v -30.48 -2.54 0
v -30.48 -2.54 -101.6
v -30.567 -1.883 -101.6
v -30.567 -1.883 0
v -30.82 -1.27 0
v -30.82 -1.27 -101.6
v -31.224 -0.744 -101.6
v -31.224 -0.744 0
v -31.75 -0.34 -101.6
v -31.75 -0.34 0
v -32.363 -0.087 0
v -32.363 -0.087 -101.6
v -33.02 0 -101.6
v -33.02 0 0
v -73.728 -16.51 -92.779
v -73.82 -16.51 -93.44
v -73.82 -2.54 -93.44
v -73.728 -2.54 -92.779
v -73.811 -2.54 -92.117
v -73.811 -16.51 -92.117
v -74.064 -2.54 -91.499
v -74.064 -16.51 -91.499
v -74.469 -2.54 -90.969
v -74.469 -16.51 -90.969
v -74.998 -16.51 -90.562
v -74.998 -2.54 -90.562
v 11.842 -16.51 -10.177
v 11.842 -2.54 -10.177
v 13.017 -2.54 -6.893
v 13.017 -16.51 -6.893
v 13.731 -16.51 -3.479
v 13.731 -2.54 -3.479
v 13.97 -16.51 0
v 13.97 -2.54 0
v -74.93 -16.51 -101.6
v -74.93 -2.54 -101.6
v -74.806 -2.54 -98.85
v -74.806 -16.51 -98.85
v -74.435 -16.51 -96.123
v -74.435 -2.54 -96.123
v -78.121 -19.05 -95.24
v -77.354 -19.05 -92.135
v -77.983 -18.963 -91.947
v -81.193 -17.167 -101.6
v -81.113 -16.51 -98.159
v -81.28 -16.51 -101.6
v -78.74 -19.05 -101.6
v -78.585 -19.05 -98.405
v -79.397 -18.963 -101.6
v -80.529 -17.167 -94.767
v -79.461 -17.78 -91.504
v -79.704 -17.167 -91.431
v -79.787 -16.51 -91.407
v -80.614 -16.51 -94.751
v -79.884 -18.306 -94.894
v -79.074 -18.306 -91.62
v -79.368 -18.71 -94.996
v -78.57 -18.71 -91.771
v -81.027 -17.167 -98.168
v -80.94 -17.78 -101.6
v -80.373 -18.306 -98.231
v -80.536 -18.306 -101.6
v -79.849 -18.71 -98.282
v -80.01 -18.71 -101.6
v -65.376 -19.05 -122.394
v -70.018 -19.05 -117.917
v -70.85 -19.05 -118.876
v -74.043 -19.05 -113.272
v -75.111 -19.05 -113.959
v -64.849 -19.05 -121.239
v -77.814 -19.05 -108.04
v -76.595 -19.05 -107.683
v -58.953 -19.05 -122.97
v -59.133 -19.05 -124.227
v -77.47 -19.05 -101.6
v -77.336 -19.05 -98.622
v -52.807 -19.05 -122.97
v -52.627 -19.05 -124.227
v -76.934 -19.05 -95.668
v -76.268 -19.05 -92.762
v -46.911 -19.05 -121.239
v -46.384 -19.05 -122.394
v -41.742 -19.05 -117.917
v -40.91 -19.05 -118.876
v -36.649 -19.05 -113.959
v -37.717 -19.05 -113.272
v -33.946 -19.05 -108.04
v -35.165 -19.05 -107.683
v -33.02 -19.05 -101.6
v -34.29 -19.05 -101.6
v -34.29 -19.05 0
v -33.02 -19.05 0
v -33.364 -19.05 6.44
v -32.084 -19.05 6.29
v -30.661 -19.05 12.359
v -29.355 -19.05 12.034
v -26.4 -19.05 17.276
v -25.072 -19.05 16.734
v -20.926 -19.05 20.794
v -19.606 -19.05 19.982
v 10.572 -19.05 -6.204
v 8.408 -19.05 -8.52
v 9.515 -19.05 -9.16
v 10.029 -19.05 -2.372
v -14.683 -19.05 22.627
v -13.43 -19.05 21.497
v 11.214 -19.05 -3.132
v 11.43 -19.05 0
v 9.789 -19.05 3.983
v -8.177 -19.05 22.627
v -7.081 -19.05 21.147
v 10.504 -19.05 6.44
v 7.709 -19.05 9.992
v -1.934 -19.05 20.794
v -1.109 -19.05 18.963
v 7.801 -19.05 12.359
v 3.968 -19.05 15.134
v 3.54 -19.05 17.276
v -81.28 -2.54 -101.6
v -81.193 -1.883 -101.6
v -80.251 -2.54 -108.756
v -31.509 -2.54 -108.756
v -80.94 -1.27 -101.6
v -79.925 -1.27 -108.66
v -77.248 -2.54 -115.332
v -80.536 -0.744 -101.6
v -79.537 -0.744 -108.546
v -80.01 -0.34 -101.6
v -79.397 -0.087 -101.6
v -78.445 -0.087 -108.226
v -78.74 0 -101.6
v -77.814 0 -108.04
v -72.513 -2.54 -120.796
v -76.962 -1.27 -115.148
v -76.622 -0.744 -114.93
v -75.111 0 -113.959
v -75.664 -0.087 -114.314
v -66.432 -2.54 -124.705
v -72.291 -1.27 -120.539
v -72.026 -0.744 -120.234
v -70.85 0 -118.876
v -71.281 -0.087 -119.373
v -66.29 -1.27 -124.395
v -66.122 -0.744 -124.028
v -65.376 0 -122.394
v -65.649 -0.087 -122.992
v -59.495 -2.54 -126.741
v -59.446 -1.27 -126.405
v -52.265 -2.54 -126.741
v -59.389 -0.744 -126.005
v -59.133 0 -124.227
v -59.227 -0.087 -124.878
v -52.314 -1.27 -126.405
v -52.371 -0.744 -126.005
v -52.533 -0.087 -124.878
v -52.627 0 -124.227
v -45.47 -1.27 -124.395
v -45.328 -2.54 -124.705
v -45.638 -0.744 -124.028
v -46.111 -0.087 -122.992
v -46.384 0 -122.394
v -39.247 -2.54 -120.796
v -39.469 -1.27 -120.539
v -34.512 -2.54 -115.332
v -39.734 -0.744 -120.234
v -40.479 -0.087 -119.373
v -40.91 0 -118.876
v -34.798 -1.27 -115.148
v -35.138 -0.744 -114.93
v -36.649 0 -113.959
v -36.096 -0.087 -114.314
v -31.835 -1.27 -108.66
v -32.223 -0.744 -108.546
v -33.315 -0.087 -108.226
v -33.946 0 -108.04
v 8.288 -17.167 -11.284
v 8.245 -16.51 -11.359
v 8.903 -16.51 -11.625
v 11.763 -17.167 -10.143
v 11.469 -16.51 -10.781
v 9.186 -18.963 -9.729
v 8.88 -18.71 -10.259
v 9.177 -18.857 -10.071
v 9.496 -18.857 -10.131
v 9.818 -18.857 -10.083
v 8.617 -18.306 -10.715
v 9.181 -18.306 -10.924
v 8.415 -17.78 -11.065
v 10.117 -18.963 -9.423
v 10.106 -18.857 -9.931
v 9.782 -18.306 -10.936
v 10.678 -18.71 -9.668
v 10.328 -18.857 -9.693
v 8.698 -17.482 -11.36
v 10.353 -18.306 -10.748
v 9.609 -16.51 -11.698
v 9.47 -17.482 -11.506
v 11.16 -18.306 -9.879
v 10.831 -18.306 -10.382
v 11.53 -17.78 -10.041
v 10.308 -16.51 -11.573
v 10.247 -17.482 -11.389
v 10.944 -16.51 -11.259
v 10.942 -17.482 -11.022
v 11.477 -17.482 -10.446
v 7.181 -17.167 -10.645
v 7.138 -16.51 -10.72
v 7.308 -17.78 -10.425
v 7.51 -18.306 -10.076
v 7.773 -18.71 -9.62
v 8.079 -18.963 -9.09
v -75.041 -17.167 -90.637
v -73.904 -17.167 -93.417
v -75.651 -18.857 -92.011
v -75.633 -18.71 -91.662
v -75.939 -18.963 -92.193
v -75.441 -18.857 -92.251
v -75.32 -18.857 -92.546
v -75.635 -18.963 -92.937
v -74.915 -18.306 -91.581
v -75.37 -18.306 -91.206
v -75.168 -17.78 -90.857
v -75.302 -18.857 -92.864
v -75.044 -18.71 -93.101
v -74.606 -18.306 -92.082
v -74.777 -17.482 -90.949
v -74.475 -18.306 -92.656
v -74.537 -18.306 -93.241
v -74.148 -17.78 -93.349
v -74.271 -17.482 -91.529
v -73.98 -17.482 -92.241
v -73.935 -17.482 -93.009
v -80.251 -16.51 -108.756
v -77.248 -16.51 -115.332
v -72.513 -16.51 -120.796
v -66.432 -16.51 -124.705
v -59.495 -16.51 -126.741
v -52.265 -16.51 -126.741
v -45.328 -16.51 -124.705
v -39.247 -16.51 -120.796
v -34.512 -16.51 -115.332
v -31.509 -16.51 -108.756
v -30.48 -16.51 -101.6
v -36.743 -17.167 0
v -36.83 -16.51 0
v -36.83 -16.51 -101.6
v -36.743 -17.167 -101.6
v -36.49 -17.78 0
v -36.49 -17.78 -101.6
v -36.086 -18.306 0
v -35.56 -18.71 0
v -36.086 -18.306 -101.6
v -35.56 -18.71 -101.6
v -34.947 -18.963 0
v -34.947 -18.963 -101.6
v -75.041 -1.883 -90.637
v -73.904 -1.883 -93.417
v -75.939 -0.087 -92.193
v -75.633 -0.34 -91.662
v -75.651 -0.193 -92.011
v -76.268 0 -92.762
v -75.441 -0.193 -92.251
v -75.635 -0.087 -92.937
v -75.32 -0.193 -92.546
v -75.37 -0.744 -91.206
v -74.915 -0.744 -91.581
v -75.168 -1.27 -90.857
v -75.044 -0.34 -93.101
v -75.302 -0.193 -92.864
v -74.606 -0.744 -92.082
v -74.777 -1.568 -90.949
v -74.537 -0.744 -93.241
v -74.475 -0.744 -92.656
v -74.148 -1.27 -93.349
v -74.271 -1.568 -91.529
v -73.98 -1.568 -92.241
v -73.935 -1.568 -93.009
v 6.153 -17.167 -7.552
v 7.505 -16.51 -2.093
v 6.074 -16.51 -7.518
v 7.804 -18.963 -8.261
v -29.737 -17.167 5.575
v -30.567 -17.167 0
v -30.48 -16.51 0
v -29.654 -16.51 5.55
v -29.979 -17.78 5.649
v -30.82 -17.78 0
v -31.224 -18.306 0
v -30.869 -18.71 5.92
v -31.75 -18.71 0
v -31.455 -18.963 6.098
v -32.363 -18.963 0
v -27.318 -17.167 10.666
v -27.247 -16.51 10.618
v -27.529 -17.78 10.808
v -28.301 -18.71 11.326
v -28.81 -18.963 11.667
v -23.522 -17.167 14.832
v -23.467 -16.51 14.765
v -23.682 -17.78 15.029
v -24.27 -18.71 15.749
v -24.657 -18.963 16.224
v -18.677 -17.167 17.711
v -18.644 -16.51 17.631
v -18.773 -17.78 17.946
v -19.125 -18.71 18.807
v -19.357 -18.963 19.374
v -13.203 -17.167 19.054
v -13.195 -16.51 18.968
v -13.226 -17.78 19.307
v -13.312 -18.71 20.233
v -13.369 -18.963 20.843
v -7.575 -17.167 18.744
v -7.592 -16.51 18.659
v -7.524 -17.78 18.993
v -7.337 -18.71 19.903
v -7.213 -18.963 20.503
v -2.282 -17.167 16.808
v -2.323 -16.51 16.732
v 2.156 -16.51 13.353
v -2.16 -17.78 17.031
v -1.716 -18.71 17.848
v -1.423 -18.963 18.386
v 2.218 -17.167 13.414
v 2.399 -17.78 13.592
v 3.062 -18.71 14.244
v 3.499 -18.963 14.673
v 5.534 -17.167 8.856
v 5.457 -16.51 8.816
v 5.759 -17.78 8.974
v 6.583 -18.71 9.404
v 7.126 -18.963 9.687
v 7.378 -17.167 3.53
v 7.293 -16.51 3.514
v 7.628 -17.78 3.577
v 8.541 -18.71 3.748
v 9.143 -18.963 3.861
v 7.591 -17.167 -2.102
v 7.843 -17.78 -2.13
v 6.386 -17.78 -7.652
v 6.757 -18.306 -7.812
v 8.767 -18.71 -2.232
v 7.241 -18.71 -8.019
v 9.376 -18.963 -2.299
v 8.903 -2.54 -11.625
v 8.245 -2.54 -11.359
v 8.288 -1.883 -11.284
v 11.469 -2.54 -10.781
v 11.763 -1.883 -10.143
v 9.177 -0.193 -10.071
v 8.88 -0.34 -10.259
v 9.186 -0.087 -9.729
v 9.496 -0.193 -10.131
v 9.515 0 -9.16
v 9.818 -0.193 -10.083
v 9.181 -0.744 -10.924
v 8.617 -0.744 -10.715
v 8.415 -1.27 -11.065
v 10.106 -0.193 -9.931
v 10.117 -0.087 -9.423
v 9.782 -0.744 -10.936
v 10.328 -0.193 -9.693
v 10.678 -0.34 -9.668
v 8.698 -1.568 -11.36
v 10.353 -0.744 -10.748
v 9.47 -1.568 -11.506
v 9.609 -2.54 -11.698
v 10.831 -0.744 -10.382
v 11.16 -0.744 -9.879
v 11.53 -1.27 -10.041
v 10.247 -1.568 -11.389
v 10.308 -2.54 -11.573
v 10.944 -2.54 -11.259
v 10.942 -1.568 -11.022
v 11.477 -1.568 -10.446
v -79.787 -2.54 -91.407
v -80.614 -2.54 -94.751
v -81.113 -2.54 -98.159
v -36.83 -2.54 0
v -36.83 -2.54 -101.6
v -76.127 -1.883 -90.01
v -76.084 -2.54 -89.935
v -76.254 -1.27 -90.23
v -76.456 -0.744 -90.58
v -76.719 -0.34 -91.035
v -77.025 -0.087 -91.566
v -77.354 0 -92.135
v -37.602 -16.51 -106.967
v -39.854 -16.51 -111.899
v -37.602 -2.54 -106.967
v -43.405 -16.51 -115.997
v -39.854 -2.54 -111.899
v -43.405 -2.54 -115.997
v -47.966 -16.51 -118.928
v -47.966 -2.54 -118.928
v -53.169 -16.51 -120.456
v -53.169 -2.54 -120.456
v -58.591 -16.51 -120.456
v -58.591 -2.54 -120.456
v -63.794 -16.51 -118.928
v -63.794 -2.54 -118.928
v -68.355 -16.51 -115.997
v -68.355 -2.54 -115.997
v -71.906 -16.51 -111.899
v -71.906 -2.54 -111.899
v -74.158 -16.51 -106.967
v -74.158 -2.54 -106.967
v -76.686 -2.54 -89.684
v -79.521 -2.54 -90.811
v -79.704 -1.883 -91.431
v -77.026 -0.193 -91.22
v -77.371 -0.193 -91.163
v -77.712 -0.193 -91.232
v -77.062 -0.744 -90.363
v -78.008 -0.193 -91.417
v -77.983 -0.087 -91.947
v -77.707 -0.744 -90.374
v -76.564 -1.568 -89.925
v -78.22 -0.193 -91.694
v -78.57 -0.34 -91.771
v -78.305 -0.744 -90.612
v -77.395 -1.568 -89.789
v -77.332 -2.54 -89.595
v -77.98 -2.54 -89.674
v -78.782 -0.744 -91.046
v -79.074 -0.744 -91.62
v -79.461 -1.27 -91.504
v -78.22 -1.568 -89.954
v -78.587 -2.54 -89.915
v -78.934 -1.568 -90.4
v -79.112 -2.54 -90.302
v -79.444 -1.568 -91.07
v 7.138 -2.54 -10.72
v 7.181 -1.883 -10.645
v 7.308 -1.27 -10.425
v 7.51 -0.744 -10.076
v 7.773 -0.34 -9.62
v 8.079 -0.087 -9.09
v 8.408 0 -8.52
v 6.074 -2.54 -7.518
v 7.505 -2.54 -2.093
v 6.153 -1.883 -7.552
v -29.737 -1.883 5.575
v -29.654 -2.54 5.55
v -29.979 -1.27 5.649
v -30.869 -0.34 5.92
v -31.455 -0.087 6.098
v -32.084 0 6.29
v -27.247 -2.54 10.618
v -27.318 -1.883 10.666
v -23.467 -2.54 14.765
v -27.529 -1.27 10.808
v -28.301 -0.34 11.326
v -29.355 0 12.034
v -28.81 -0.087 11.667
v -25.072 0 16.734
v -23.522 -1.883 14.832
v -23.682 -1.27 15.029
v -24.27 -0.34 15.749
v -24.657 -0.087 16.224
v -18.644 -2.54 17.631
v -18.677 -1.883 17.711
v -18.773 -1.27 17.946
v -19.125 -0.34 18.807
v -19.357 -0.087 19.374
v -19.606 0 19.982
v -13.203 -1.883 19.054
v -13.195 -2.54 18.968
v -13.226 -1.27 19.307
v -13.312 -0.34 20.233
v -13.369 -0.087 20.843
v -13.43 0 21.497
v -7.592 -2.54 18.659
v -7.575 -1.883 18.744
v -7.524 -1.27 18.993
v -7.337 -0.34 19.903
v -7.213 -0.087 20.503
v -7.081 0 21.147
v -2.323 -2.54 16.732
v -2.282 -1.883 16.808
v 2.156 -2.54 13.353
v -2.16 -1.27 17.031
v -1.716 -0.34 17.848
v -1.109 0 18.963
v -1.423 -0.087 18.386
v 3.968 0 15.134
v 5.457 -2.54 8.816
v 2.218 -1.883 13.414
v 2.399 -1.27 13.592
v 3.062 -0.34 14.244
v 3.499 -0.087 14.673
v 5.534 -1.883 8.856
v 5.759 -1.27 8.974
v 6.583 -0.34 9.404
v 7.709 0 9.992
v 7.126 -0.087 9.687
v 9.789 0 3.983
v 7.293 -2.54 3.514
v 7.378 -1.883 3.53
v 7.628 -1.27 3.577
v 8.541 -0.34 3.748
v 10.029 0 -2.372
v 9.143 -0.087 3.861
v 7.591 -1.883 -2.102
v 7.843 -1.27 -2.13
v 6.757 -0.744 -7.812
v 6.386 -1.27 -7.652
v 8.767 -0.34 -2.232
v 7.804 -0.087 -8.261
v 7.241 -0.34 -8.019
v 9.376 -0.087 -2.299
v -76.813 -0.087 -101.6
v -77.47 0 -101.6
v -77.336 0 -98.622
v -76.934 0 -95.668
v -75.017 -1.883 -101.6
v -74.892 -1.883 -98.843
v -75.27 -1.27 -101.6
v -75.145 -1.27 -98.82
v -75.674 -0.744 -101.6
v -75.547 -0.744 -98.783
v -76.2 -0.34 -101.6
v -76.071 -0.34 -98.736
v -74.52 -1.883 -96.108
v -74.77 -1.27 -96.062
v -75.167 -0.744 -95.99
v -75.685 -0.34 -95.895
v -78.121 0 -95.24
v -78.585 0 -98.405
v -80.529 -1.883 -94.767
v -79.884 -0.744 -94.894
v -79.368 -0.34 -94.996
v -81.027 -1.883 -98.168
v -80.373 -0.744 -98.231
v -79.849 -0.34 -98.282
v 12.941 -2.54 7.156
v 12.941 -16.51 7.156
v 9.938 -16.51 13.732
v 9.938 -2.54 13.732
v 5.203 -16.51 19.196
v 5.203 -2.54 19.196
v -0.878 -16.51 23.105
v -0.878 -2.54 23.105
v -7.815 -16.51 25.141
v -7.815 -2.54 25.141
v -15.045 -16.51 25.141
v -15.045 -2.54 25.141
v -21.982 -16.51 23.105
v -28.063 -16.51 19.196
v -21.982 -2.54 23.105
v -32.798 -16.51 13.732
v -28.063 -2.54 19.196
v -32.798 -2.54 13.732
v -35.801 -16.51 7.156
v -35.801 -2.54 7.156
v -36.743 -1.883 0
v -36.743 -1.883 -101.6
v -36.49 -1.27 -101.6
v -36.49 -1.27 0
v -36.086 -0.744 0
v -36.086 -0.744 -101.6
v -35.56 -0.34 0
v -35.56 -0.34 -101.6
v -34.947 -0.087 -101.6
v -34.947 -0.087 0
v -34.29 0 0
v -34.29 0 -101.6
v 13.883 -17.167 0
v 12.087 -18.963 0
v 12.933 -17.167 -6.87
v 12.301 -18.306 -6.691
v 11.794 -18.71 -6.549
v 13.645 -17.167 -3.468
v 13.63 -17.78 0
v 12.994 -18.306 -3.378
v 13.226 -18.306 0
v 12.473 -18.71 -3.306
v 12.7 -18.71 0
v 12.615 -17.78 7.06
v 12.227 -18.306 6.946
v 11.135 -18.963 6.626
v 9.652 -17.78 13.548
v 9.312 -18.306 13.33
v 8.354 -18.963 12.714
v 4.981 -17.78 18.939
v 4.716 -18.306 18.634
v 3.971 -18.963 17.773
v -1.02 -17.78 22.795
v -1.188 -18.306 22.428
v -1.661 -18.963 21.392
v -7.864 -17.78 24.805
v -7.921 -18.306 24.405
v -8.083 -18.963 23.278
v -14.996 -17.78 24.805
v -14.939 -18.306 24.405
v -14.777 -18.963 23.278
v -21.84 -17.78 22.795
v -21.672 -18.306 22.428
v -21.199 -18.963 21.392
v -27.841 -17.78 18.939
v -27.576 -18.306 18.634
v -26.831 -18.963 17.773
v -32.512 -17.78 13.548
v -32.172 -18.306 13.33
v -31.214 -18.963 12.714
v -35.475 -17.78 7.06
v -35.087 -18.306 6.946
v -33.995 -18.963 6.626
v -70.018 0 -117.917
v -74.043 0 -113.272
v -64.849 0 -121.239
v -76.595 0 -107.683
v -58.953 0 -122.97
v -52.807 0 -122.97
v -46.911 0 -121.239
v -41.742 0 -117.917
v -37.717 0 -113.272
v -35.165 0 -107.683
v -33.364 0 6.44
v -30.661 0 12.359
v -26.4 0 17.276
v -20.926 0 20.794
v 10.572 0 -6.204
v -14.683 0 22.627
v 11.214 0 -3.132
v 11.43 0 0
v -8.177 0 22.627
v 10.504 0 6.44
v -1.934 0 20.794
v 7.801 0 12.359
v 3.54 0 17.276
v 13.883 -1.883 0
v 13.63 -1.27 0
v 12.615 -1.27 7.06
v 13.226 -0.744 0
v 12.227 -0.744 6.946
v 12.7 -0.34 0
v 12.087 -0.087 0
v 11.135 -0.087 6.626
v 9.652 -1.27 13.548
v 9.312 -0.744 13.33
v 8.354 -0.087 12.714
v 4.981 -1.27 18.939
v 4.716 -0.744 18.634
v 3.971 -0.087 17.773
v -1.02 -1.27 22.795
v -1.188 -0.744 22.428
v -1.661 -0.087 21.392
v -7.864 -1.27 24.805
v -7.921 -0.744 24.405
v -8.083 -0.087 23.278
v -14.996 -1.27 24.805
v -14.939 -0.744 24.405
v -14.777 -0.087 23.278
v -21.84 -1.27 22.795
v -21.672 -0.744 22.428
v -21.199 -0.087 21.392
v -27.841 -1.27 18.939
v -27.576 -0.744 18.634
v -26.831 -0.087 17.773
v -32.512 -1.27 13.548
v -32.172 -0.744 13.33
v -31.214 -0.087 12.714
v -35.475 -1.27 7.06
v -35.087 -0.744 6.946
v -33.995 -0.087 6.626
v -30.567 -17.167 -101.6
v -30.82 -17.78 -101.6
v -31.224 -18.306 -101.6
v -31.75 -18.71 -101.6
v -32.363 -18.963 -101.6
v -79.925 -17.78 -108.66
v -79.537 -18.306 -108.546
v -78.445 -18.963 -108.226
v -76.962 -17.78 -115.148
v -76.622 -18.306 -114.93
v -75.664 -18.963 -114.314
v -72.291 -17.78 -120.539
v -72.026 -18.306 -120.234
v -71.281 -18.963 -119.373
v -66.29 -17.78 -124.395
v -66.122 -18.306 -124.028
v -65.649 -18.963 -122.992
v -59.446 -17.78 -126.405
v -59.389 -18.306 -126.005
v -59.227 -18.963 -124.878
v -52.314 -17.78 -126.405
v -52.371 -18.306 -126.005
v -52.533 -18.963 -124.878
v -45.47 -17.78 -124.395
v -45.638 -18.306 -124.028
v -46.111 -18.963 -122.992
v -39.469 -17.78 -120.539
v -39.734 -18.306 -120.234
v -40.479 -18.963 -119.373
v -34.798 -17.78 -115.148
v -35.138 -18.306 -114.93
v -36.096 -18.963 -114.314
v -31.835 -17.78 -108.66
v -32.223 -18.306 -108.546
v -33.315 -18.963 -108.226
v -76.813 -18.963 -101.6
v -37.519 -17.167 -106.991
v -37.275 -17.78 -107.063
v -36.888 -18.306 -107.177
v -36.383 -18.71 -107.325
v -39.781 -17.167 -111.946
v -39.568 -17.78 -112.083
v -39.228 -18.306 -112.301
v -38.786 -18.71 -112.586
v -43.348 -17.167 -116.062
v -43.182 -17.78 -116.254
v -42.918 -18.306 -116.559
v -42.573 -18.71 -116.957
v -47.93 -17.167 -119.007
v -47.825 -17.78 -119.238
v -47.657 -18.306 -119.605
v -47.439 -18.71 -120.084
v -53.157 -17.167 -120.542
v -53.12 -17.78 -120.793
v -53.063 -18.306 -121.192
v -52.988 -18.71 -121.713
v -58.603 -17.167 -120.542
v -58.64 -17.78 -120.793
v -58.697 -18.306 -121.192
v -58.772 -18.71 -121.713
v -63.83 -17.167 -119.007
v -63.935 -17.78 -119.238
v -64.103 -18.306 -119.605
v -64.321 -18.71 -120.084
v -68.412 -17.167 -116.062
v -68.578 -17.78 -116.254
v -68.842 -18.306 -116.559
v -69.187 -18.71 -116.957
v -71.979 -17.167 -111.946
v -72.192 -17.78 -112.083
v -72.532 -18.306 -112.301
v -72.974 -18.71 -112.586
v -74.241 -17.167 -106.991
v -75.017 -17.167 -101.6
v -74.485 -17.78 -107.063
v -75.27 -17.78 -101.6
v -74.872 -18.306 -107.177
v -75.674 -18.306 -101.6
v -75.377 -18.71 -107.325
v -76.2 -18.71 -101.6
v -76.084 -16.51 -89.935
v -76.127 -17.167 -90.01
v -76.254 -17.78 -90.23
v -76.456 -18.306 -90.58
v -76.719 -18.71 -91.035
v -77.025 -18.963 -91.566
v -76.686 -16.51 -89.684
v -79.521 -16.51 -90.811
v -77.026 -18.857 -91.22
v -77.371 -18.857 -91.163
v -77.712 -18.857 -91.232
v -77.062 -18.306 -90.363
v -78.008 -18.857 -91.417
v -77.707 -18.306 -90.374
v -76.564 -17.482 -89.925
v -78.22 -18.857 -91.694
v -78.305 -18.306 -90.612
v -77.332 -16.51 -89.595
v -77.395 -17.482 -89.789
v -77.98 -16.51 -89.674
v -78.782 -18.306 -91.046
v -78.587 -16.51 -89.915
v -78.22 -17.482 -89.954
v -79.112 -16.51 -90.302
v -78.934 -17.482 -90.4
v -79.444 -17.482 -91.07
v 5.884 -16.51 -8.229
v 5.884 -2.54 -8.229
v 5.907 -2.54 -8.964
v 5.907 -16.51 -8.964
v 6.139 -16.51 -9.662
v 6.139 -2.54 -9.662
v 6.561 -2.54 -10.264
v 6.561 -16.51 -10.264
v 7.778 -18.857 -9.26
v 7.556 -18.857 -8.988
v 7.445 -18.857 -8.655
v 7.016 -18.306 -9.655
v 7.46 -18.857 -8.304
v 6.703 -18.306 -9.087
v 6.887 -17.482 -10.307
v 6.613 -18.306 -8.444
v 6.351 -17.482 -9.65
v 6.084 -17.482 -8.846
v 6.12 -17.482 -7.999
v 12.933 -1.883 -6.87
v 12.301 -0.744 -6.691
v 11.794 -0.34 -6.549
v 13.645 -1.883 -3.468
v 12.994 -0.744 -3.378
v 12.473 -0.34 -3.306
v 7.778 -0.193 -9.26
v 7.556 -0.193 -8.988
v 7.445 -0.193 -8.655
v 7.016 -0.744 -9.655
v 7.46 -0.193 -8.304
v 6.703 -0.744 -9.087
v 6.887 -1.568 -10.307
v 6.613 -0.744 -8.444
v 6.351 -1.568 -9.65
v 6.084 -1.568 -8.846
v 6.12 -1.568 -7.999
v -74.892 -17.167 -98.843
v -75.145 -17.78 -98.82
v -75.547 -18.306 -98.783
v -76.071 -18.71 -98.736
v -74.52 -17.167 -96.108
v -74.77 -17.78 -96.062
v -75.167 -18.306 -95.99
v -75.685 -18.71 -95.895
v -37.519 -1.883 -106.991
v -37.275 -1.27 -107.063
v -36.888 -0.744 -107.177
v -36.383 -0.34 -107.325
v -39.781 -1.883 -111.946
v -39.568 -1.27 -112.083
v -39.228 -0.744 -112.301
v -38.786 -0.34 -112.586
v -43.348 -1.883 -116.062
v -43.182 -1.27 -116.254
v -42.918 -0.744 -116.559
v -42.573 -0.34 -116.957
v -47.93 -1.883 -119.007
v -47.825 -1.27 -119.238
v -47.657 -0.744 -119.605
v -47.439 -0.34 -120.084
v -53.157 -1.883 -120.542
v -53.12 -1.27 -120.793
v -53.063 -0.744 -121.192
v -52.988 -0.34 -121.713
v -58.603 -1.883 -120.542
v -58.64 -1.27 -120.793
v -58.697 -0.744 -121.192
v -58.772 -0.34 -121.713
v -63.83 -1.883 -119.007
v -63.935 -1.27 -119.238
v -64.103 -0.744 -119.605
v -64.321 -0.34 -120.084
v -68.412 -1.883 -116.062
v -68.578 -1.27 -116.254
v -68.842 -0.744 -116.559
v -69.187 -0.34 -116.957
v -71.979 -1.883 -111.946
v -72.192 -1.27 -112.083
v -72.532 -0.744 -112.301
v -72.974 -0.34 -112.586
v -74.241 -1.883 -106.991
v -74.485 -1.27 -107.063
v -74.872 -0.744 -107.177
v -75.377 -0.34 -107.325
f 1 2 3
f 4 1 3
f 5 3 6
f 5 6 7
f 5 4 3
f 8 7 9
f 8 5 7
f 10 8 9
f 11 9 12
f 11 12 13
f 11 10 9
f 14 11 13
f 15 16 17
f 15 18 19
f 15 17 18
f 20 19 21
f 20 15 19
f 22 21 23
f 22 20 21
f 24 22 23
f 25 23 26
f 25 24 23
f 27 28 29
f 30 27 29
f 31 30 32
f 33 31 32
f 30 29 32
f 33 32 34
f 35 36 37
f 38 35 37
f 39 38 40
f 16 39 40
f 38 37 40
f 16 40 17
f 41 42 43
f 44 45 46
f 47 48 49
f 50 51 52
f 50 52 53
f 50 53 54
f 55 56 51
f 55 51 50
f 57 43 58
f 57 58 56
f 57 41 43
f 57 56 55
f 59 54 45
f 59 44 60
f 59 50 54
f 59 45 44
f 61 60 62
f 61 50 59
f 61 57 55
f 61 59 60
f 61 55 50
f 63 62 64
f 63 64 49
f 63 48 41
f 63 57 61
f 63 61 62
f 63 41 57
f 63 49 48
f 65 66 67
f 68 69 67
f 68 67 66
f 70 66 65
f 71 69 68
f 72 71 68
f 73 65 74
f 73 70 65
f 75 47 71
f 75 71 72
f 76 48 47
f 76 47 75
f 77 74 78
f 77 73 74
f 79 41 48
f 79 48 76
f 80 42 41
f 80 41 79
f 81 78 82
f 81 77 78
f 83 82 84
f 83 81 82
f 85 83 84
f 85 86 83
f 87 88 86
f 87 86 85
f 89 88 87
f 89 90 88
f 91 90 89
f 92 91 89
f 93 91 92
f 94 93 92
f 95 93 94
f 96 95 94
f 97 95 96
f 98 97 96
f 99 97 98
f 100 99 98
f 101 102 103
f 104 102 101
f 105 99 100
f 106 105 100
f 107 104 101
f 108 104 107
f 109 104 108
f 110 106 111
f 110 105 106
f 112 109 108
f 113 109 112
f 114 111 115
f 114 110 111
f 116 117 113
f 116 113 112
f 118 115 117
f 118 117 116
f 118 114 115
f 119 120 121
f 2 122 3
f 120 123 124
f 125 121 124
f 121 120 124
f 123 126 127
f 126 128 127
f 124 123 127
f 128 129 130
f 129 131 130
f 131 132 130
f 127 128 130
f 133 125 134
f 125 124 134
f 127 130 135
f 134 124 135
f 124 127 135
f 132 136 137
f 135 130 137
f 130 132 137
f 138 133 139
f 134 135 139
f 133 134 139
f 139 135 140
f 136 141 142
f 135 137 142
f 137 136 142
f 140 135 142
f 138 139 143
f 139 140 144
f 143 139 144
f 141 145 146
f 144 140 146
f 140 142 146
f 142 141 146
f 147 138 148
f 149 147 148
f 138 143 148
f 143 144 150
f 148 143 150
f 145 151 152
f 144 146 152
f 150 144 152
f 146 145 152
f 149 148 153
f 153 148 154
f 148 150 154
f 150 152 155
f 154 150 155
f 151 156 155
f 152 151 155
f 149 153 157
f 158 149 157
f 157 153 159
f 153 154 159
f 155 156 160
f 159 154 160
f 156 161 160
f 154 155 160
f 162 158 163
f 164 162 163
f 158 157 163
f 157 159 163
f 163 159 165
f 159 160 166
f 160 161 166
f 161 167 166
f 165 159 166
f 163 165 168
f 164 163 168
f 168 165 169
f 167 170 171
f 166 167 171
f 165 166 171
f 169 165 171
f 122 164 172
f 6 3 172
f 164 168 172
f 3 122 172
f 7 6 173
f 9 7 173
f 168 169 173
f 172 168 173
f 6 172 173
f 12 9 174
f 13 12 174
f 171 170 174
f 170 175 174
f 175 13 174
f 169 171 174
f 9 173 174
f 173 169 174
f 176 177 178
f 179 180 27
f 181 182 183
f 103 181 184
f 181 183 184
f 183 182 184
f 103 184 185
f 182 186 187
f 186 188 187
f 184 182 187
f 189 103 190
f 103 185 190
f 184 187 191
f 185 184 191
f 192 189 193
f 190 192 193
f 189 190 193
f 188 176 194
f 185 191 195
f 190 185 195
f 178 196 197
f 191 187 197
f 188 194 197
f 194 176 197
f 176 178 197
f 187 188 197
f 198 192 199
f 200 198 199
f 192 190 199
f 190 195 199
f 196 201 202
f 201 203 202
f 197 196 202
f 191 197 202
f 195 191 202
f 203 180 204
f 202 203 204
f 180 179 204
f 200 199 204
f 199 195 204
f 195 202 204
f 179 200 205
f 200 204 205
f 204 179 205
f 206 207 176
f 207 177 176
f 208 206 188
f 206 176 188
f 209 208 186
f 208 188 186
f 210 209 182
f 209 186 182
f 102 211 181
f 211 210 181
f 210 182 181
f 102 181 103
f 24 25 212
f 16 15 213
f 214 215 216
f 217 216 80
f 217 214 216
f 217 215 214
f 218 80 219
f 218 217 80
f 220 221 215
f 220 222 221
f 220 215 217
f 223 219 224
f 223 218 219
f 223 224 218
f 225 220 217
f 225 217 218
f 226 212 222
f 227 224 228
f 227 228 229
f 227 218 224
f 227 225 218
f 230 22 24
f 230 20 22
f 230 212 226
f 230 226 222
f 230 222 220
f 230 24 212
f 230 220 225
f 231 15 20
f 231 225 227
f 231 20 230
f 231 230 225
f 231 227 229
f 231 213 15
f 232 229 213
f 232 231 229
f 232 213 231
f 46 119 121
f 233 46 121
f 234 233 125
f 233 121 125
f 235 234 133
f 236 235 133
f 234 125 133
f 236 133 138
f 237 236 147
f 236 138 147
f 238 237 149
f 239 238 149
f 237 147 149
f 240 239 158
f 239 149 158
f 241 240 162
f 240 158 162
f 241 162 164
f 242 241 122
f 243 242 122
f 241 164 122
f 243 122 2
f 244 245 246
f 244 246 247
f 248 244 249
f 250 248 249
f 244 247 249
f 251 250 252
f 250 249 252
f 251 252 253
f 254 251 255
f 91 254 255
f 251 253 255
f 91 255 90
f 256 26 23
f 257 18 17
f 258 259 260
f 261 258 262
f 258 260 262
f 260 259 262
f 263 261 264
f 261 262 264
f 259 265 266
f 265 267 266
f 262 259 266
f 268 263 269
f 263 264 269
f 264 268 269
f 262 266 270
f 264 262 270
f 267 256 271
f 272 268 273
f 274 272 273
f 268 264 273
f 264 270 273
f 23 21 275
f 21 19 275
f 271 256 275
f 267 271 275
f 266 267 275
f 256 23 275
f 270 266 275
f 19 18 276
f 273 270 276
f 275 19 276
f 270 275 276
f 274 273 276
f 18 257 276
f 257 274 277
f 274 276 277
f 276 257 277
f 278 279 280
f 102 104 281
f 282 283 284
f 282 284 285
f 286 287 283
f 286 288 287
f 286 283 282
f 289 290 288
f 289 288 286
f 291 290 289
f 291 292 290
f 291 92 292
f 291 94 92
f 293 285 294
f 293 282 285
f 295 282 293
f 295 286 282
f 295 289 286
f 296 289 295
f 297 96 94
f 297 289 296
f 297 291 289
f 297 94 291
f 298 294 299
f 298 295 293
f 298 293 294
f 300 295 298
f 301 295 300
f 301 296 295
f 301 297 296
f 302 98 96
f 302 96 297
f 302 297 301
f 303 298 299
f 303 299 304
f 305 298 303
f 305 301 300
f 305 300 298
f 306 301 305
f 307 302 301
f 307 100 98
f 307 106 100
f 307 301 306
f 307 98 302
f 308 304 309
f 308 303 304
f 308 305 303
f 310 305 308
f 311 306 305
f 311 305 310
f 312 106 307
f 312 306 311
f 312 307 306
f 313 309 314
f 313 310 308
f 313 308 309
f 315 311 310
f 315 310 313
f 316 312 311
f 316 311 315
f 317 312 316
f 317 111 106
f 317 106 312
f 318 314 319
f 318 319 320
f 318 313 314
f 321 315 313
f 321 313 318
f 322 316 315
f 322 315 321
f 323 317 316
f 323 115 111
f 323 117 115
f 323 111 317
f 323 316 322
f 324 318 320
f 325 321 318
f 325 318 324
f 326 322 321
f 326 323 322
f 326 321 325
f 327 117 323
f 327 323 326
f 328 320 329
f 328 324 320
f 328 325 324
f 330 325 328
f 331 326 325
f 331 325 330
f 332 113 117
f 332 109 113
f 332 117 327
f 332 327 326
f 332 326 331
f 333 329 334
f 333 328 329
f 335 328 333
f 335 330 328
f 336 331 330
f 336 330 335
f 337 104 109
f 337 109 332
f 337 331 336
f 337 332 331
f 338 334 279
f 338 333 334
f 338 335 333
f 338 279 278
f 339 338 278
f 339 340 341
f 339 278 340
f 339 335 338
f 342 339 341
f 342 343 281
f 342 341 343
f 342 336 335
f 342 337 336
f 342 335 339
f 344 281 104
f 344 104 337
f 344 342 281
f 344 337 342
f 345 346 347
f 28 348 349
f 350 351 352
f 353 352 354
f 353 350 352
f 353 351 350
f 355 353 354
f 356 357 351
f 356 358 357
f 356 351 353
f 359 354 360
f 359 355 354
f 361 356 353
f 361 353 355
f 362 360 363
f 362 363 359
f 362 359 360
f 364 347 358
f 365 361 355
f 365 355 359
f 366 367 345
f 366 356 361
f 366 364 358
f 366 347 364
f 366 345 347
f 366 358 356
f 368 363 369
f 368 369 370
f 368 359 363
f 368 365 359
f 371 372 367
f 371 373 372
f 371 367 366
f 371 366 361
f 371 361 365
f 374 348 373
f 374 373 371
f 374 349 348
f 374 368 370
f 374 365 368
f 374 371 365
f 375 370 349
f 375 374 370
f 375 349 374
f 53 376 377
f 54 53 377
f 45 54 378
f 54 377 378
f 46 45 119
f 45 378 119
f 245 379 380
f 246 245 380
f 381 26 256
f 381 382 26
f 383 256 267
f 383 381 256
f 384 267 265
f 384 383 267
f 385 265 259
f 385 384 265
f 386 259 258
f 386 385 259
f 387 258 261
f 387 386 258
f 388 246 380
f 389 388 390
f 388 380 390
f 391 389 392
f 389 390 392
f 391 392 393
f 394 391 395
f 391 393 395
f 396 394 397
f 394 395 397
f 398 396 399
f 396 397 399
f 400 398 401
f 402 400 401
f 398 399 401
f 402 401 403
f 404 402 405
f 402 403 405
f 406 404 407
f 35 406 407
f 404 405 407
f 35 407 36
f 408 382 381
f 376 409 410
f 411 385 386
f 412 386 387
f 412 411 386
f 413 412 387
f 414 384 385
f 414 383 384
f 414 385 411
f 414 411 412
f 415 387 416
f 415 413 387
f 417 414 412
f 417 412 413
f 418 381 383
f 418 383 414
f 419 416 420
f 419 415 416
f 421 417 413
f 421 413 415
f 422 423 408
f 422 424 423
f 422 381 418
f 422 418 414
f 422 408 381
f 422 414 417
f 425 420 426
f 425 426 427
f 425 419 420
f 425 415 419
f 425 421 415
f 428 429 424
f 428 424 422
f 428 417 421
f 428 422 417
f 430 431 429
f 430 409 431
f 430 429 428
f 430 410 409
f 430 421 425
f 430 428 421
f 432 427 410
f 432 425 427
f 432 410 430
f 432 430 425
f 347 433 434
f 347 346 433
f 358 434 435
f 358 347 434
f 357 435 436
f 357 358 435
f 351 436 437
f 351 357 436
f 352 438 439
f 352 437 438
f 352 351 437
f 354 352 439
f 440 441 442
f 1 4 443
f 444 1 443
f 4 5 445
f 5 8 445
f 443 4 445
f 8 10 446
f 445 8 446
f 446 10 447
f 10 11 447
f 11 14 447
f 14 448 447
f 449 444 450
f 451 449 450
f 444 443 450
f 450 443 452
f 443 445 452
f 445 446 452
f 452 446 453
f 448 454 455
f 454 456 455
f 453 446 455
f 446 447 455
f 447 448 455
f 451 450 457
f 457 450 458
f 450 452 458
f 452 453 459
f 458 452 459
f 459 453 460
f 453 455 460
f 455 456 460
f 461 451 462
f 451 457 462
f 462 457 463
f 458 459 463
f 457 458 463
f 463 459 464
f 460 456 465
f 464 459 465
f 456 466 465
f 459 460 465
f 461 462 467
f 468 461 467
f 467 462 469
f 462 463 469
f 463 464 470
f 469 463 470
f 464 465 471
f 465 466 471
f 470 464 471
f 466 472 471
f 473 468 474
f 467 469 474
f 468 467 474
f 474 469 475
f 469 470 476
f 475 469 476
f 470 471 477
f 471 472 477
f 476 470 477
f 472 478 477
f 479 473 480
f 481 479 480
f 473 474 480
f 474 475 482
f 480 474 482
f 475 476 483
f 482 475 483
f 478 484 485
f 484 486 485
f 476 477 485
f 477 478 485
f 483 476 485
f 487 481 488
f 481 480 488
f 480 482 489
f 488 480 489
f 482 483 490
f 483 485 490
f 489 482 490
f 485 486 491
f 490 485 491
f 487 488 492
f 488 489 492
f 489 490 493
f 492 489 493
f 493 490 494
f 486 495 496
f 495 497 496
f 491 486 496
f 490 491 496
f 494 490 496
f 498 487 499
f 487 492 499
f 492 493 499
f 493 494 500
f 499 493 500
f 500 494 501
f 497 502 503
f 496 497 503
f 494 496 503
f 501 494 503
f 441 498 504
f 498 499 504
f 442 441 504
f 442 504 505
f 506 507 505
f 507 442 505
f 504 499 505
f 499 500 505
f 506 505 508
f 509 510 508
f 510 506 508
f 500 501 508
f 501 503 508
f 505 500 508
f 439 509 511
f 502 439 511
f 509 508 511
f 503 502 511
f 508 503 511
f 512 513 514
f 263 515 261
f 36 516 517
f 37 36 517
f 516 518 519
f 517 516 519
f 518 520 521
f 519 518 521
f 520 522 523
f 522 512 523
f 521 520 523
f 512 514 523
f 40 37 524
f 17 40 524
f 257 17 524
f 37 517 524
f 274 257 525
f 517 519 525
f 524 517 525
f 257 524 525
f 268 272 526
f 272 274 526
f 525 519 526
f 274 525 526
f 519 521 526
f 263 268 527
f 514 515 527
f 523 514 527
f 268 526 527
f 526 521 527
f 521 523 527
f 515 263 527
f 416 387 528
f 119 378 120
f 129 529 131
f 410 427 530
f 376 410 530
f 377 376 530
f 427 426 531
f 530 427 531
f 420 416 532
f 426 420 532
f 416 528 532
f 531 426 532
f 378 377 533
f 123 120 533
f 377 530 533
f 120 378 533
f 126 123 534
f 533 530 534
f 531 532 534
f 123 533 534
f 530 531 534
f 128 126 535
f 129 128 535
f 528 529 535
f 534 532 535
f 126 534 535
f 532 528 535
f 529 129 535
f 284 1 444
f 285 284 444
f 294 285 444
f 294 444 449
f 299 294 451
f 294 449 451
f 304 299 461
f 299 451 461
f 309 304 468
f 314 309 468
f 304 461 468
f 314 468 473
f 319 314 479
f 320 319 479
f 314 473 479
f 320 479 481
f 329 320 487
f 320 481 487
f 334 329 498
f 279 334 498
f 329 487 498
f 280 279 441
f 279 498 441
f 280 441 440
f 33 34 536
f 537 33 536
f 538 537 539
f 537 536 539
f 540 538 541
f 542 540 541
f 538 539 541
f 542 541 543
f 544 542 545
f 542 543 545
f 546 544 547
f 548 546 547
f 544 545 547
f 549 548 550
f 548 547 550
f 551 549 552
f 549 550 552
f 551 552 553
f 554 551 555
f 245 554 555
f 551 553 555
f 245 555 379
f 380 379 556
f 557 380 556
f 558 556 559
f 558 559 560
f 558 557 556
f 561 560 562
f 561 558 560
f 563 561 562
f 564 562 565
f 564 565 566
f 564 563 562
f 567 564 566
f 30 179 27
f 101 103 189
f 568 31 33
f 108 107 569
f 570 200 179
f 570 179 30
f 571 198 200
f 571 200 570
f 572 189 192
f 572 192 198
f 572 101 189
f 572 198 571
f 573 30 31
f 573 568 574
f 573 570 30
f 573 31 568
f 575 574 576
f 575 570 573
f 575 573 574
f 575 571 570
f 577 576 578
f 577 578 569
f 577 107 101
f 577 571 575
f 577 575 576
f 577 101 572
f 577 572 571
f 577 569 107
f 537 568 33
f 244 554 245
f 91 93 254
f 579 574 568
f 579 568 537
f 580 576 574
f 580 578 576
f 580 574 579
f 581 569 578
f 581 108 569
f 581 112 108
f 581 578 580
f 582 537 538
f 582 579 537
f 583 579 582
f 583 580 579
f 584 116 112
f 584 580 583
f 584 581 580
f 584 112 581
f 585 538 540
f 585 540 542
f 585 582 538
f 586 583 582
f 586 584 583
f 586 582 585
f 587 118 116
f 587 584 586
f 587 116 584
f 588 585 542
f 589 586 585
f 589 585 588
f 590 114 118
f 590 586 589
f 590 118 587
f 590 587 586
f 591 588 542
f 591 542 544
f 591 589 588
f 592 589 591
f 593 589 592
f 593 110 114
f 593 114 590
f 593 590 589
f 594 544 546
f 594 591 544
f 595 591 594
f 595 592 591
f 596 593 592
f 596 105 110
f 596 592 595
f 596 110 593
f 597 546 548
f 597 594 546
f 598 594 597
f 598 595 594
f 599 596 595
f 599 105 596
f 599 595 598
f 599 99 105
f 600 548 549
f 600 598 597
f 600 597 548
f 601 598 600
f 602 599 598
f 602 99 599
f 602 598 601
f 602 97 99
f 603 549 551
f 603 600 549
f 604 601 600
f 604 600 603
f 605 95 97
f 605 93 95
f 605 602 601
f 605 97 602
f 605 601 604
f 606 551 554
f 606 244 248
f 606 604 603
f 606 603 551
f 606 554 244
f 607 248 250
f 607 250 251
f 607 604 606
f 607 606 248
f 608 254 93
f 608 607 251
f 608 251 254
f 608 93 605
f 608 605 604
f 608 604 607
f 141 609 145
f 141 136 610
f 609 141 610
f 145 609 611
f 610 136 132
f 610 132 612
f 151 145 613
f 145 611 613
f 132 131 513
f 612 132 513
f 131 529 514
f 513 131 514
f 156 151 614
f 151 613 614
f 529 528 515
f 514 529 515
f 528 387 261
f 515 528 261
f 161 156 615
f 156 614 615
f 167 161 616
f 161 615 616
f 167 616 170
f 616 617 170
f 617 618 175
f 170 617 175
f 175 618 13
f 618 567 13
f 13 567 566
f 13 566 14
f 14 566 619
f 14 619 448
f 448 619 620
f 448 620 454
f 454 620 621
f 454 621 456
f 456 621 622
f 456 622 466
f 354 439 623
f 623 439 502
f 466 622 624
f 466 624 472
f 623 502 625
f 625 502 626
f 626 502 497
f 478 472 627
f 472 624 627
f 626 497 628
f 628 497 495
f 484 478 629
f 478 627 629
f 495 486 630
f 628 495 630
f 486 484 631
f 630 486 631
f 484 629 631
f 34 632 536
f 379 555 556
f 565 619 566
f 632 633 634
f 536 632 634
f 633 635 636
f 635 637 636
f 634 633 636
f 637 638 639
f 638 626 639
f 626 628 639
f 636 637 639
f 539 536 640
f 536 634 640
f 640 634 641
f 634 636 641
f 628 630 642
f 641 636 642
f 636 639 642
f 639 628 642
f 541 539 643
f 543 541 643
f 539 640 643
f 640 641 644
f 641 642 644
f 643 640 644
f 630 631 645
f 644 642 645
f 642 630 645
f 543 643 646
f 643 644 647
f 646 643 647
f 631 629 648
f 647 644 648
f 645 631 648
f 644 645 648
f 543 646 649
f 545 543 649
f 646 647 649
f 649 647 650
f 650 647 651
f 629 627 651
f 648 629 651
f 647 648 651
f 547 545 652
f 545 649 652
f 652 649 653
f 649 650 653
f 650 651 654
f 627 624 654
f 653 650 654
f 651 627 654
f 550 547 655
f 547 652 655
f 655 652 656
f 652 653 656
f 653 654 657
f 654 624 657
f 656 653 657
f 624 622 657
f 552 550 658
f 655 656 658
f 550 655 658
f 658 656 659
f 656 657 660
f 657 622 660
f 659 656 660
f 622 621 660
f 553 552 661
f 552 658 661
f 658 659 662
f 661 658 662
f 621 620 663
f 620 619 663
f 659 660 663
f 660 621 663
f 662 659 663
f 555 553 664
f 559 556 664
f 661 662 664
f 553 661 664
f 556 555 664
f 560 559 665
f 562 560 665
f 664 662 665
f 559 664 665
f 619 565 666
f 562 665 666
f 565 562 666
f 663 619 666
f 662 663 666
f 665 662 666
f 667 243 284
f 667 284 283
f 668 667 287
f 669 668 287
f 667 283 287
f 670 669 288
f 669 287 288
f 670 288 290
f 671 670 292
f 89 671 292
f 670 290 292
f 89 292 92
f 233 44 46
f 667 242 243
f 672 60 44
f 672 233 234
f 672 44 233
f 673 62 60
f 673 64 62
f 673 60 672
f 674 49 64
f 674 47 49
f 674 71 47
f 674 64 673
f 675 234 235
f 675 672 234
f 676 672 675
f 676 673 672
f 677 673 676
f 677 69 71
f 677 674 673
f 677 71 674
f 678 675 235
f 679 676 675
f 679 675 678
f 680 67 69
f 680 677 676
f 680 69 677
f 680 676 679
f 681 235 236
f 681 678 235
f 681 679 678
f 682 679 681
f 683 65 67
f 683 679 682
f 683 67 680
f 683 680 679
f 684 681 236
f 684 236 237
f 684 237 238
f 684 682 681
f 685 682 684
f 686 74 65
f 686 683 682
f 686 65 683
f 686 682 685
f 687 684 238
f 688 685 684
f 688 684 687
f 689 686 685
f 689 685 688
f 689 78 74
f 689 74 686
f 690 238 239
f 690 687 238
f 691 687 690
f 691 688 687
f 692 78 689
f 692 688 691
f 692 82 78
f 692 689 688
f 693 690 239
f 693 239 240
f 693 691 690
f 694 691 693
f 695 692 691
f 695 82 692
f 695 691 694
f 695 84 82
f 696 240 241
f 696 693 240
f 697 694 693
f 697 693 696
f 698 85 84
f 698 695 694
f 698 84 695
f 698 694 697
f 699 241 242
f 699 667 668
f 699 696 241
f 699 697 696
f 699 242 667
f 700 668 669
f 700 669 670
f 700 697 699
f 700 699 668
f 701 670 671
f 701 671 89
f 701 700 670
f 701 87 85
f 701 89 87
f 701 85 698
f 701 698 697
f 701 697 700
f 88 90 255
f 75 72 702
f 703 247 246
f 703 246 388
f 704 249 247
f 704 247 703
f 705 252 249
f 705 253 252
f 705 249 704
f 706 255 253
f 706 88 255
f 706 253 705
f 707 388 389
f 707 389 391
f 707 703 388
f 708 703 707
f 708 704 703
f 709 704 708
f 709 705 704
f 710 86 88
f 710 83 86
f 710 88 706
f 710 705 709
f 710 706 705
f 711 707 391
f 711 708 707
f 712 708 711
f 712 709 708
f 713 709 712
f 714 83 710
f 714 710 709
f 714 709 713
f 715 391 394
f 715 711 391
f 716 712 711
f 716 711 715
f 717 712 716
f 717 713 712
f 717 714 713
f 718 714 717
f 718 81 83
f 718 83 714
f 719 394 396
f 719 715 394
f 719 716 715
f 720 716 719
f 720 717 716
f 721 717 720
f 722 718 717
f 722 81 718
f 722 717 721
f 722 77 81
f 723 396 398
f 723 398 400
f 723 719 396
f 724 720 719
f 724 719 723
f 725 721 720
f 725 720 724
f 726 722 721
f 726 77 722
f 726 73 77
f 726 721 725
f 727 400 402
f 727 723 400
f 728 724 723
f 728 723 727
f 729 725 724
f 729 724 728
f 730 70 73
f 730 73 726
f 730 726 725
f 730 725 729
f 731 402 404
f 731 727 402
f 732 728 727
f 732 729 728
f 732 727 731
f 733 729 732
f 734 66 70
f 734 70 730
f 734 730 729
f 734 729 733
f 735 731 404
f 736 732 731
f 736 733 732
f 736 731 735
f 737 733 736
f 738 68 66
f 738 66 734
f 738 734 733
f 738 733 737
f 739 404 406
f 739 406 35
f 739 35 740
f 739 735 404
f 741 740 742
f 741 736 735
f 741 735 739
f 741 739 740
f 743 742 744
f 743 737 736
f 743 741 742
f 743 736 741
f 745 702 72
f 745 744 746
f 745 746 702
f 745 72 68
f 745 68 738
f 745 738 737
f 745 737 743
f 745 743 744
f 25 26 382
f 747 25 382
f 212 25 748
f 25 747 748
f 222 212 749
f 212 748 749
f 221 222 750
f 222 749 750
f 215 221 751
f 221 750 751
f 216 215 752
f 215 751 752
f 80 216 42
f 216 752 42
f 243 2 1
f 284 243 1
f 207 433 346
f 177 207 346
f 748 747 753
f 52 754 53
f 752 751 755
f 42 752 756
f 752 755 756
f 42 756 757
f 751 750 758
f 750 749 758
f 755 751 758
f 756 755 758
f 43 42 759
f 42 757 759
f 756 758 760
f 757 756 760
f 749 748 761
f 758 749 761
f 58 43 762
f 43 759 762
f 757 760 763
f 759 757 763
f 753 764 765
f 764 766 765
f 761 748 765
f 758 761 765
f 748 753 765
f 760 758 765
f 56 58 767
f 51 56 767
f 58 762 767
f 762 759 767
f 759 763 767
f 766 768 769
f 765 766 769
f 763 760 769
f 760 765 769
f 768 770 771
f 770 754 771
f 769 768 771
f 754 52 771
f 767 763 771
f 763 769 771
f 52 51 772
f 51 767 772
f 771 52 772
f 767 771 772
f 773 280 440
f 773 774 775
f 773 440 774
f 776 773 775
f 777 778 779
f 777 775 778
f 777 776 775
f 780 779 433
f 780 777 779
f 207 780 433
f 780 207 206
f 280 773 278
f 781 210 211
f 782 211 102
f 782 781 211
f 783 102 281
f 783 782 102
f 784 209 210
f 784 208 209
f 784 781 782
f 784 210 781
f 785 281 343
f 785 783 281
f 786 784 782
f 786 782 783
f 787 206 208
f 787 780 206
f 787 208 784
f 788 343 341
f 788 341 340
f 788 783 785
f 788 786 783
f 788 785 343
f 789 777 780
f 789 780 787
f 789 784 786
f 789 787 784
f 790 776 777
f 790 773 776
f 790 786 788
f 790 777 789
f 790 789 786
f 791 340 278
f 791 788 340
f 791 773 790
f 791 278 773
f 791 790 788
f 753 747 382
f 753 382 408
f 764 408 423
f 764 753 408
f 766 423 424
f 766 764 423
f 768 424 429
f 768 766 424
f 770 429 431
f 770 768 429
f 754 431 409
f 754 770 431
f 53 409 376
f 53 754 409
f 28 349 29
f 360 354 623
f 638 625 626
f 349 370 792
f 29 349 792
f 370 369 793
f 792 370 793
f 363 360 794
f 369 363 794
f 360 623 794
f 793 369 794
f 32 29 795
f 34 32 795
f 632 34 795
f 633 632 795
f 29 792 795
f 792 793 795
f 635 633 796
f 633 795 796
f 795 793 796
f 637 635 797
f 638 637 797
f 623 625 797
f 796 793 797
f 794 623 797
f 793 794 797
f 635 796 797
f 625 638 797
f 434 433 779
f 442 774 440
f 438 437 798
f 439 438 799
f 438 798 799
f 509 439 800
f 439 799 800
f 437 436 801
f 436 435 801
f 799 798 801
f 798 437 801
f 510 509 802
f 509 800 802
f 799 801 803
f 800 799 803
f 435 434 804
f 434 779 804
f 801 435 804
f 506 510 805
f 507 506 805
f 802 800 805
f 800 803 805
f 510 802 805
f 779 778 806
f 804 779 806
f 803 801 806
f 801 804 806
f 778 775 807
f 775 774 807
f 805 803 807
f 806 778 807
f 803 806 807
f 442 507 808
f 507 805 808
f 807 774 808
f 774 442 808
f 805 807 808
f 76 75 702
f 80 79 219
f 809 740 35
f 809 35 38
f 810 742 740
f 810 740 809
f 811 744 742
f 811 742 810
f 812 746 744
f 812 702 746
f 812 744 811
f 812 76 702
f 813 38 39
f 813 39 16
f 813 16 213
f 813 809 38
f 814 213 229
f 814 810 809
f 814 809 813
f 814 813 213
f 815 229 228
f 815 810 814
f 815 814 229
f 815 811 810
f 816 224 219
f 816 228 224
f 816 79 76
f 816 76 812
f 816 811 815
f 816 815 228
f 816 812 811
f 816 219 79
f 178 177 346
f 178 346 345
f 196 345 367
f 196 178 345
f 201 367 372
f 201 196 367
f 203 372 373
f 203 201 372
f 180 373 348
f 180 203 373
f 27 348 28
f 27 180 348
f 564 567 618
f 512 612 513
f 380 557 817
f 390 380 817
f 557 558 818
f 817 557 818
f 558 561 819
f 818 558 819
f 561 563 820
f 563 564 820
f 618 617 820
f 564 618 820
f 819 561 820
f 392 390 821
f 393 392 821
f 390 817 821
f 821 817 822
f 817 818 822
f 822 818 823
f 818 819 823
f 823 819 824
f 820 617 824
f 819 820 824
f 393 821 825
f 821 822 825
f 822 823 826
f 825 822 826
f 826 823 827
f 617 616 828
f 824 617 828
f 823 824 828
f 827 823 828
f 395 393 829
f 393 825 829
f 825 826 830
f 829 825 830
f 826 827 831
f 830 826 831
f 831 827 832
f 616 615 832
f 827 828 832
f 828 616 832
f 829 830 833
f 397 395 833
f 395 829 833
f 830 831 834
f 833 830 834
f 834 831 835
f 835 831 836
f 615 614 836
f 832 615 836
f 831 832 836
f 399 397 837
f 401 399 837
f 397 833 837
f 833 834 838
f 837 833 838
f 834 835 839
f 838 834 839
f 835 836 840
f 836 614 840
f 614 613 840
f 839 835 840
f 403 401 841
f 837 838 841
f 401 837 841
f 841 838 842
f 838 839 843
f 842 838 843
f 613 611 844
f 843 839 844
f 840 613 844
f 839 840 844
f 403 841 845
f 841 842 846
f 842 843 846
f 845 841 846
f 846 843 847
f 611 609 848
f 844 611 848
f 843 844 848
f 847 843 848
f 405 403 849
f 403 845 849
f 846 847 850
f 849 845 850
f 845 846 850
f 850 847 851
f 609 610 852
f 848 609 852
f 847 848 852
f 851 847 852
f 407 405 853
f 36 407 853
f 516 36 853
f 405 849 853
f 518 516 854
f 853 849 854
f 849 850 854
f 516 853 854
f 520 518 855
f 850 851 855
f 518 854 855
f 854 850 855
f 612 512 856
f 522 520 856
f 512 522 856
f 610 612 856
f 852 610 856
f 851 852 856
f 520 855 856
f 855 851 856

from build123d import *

# Parameters (mm, degrees)
F1_DEPTH = 19.05
F2_R     = 2.54


# Not quite as in the source:
# - a feature names something its author has since deleted; it is built from what else it names


with BuildPart() as f1:
    # F0 (on Front) → F1 (new body)
    with BuildSketch(Plane.XZ):
        with BuildLine():
            ThreePointArc((13.97, 0), (-11.43, 25.4), (-36.83, 0))
            Line((-36.83, 0), (-36.83, -101.6))
            ThreePointArc((-36.83, -101.6), (-55.88, -120.65), (-74.93, -101.6))
            ThreePointArc((-74.93, -101.6), (-74.5044281022, -96.5179462529), (-73.2395664242, -91.577449652))
            Line((-73.2395664242, -91.577449652), (-78.7388277382, -88.402449652))
            ThreePointArc((-78.7388277382, -88.402449652), (-80.638925247, -94.8800131761), (-81.28, -101.6))
            ThreePointArc((-81.28, -101.6), (-55.88, -127), (-30.48, -101.6))
            Line((-30.48, -101.6), (-30.48, 0))
            ThreePointArc((-30.48, 0), (-6.4994971908, 18.4008869908), (5.0677839421, -9.525))
            Line((5.0677839421, -9.525), (10.5670452561, -12.7))
            ThreePointArc((10.5670452561, -12.7), (13.1045159877, -6.5740037456), (13.97, 0))
        make_face()
    extrude(amount=F1_DEPTH)

    # F2
    f2_edges = [f1.edges().sort_by_distance(p)[0] for p in [
        (-73.239566, -9.525, -91.57745),
        (-78.738828, -9.525, -88.40245),
        (-75.989197, 0, -89.98995),
        (-75.989197, -19.05, -89.98995),
        (5.067784, -9.525, -9.525),
        (10.567045, -9.525, -12.7),
        (7.817415, 0, -11.1125),
        (7.817415, -19.05, -11.1125),
        (-30.48, 0, -50.8),
        (-6.499497, 0, 18.400887),
        (-4.855996, 0, 24.534516),
        (-36.83, 0, -50.8),
        (-55.88, 0, -120.65),
        (-74.504428, 0, -96.517946),
        (-80.638925, 0, -94.880013),
        (-55.88, 0, -127),
        (-30.48, -19.05, -50.8),
        (-6.499497, -19.05, 18.400887),
        (-4.855996, -19.05, 24.534516),
        (-36.83, -19.05, -50.8),
        (-55.88, -19.05, -120.65),
        (-74.504428, -19.05, -96.517946),
        (-80.638925, -19.05, -94.880013),
        (-55.88, -19.05, -127),
    ]]
    fillet(f2_edges, radius=F2_R)


solid = f1.part
